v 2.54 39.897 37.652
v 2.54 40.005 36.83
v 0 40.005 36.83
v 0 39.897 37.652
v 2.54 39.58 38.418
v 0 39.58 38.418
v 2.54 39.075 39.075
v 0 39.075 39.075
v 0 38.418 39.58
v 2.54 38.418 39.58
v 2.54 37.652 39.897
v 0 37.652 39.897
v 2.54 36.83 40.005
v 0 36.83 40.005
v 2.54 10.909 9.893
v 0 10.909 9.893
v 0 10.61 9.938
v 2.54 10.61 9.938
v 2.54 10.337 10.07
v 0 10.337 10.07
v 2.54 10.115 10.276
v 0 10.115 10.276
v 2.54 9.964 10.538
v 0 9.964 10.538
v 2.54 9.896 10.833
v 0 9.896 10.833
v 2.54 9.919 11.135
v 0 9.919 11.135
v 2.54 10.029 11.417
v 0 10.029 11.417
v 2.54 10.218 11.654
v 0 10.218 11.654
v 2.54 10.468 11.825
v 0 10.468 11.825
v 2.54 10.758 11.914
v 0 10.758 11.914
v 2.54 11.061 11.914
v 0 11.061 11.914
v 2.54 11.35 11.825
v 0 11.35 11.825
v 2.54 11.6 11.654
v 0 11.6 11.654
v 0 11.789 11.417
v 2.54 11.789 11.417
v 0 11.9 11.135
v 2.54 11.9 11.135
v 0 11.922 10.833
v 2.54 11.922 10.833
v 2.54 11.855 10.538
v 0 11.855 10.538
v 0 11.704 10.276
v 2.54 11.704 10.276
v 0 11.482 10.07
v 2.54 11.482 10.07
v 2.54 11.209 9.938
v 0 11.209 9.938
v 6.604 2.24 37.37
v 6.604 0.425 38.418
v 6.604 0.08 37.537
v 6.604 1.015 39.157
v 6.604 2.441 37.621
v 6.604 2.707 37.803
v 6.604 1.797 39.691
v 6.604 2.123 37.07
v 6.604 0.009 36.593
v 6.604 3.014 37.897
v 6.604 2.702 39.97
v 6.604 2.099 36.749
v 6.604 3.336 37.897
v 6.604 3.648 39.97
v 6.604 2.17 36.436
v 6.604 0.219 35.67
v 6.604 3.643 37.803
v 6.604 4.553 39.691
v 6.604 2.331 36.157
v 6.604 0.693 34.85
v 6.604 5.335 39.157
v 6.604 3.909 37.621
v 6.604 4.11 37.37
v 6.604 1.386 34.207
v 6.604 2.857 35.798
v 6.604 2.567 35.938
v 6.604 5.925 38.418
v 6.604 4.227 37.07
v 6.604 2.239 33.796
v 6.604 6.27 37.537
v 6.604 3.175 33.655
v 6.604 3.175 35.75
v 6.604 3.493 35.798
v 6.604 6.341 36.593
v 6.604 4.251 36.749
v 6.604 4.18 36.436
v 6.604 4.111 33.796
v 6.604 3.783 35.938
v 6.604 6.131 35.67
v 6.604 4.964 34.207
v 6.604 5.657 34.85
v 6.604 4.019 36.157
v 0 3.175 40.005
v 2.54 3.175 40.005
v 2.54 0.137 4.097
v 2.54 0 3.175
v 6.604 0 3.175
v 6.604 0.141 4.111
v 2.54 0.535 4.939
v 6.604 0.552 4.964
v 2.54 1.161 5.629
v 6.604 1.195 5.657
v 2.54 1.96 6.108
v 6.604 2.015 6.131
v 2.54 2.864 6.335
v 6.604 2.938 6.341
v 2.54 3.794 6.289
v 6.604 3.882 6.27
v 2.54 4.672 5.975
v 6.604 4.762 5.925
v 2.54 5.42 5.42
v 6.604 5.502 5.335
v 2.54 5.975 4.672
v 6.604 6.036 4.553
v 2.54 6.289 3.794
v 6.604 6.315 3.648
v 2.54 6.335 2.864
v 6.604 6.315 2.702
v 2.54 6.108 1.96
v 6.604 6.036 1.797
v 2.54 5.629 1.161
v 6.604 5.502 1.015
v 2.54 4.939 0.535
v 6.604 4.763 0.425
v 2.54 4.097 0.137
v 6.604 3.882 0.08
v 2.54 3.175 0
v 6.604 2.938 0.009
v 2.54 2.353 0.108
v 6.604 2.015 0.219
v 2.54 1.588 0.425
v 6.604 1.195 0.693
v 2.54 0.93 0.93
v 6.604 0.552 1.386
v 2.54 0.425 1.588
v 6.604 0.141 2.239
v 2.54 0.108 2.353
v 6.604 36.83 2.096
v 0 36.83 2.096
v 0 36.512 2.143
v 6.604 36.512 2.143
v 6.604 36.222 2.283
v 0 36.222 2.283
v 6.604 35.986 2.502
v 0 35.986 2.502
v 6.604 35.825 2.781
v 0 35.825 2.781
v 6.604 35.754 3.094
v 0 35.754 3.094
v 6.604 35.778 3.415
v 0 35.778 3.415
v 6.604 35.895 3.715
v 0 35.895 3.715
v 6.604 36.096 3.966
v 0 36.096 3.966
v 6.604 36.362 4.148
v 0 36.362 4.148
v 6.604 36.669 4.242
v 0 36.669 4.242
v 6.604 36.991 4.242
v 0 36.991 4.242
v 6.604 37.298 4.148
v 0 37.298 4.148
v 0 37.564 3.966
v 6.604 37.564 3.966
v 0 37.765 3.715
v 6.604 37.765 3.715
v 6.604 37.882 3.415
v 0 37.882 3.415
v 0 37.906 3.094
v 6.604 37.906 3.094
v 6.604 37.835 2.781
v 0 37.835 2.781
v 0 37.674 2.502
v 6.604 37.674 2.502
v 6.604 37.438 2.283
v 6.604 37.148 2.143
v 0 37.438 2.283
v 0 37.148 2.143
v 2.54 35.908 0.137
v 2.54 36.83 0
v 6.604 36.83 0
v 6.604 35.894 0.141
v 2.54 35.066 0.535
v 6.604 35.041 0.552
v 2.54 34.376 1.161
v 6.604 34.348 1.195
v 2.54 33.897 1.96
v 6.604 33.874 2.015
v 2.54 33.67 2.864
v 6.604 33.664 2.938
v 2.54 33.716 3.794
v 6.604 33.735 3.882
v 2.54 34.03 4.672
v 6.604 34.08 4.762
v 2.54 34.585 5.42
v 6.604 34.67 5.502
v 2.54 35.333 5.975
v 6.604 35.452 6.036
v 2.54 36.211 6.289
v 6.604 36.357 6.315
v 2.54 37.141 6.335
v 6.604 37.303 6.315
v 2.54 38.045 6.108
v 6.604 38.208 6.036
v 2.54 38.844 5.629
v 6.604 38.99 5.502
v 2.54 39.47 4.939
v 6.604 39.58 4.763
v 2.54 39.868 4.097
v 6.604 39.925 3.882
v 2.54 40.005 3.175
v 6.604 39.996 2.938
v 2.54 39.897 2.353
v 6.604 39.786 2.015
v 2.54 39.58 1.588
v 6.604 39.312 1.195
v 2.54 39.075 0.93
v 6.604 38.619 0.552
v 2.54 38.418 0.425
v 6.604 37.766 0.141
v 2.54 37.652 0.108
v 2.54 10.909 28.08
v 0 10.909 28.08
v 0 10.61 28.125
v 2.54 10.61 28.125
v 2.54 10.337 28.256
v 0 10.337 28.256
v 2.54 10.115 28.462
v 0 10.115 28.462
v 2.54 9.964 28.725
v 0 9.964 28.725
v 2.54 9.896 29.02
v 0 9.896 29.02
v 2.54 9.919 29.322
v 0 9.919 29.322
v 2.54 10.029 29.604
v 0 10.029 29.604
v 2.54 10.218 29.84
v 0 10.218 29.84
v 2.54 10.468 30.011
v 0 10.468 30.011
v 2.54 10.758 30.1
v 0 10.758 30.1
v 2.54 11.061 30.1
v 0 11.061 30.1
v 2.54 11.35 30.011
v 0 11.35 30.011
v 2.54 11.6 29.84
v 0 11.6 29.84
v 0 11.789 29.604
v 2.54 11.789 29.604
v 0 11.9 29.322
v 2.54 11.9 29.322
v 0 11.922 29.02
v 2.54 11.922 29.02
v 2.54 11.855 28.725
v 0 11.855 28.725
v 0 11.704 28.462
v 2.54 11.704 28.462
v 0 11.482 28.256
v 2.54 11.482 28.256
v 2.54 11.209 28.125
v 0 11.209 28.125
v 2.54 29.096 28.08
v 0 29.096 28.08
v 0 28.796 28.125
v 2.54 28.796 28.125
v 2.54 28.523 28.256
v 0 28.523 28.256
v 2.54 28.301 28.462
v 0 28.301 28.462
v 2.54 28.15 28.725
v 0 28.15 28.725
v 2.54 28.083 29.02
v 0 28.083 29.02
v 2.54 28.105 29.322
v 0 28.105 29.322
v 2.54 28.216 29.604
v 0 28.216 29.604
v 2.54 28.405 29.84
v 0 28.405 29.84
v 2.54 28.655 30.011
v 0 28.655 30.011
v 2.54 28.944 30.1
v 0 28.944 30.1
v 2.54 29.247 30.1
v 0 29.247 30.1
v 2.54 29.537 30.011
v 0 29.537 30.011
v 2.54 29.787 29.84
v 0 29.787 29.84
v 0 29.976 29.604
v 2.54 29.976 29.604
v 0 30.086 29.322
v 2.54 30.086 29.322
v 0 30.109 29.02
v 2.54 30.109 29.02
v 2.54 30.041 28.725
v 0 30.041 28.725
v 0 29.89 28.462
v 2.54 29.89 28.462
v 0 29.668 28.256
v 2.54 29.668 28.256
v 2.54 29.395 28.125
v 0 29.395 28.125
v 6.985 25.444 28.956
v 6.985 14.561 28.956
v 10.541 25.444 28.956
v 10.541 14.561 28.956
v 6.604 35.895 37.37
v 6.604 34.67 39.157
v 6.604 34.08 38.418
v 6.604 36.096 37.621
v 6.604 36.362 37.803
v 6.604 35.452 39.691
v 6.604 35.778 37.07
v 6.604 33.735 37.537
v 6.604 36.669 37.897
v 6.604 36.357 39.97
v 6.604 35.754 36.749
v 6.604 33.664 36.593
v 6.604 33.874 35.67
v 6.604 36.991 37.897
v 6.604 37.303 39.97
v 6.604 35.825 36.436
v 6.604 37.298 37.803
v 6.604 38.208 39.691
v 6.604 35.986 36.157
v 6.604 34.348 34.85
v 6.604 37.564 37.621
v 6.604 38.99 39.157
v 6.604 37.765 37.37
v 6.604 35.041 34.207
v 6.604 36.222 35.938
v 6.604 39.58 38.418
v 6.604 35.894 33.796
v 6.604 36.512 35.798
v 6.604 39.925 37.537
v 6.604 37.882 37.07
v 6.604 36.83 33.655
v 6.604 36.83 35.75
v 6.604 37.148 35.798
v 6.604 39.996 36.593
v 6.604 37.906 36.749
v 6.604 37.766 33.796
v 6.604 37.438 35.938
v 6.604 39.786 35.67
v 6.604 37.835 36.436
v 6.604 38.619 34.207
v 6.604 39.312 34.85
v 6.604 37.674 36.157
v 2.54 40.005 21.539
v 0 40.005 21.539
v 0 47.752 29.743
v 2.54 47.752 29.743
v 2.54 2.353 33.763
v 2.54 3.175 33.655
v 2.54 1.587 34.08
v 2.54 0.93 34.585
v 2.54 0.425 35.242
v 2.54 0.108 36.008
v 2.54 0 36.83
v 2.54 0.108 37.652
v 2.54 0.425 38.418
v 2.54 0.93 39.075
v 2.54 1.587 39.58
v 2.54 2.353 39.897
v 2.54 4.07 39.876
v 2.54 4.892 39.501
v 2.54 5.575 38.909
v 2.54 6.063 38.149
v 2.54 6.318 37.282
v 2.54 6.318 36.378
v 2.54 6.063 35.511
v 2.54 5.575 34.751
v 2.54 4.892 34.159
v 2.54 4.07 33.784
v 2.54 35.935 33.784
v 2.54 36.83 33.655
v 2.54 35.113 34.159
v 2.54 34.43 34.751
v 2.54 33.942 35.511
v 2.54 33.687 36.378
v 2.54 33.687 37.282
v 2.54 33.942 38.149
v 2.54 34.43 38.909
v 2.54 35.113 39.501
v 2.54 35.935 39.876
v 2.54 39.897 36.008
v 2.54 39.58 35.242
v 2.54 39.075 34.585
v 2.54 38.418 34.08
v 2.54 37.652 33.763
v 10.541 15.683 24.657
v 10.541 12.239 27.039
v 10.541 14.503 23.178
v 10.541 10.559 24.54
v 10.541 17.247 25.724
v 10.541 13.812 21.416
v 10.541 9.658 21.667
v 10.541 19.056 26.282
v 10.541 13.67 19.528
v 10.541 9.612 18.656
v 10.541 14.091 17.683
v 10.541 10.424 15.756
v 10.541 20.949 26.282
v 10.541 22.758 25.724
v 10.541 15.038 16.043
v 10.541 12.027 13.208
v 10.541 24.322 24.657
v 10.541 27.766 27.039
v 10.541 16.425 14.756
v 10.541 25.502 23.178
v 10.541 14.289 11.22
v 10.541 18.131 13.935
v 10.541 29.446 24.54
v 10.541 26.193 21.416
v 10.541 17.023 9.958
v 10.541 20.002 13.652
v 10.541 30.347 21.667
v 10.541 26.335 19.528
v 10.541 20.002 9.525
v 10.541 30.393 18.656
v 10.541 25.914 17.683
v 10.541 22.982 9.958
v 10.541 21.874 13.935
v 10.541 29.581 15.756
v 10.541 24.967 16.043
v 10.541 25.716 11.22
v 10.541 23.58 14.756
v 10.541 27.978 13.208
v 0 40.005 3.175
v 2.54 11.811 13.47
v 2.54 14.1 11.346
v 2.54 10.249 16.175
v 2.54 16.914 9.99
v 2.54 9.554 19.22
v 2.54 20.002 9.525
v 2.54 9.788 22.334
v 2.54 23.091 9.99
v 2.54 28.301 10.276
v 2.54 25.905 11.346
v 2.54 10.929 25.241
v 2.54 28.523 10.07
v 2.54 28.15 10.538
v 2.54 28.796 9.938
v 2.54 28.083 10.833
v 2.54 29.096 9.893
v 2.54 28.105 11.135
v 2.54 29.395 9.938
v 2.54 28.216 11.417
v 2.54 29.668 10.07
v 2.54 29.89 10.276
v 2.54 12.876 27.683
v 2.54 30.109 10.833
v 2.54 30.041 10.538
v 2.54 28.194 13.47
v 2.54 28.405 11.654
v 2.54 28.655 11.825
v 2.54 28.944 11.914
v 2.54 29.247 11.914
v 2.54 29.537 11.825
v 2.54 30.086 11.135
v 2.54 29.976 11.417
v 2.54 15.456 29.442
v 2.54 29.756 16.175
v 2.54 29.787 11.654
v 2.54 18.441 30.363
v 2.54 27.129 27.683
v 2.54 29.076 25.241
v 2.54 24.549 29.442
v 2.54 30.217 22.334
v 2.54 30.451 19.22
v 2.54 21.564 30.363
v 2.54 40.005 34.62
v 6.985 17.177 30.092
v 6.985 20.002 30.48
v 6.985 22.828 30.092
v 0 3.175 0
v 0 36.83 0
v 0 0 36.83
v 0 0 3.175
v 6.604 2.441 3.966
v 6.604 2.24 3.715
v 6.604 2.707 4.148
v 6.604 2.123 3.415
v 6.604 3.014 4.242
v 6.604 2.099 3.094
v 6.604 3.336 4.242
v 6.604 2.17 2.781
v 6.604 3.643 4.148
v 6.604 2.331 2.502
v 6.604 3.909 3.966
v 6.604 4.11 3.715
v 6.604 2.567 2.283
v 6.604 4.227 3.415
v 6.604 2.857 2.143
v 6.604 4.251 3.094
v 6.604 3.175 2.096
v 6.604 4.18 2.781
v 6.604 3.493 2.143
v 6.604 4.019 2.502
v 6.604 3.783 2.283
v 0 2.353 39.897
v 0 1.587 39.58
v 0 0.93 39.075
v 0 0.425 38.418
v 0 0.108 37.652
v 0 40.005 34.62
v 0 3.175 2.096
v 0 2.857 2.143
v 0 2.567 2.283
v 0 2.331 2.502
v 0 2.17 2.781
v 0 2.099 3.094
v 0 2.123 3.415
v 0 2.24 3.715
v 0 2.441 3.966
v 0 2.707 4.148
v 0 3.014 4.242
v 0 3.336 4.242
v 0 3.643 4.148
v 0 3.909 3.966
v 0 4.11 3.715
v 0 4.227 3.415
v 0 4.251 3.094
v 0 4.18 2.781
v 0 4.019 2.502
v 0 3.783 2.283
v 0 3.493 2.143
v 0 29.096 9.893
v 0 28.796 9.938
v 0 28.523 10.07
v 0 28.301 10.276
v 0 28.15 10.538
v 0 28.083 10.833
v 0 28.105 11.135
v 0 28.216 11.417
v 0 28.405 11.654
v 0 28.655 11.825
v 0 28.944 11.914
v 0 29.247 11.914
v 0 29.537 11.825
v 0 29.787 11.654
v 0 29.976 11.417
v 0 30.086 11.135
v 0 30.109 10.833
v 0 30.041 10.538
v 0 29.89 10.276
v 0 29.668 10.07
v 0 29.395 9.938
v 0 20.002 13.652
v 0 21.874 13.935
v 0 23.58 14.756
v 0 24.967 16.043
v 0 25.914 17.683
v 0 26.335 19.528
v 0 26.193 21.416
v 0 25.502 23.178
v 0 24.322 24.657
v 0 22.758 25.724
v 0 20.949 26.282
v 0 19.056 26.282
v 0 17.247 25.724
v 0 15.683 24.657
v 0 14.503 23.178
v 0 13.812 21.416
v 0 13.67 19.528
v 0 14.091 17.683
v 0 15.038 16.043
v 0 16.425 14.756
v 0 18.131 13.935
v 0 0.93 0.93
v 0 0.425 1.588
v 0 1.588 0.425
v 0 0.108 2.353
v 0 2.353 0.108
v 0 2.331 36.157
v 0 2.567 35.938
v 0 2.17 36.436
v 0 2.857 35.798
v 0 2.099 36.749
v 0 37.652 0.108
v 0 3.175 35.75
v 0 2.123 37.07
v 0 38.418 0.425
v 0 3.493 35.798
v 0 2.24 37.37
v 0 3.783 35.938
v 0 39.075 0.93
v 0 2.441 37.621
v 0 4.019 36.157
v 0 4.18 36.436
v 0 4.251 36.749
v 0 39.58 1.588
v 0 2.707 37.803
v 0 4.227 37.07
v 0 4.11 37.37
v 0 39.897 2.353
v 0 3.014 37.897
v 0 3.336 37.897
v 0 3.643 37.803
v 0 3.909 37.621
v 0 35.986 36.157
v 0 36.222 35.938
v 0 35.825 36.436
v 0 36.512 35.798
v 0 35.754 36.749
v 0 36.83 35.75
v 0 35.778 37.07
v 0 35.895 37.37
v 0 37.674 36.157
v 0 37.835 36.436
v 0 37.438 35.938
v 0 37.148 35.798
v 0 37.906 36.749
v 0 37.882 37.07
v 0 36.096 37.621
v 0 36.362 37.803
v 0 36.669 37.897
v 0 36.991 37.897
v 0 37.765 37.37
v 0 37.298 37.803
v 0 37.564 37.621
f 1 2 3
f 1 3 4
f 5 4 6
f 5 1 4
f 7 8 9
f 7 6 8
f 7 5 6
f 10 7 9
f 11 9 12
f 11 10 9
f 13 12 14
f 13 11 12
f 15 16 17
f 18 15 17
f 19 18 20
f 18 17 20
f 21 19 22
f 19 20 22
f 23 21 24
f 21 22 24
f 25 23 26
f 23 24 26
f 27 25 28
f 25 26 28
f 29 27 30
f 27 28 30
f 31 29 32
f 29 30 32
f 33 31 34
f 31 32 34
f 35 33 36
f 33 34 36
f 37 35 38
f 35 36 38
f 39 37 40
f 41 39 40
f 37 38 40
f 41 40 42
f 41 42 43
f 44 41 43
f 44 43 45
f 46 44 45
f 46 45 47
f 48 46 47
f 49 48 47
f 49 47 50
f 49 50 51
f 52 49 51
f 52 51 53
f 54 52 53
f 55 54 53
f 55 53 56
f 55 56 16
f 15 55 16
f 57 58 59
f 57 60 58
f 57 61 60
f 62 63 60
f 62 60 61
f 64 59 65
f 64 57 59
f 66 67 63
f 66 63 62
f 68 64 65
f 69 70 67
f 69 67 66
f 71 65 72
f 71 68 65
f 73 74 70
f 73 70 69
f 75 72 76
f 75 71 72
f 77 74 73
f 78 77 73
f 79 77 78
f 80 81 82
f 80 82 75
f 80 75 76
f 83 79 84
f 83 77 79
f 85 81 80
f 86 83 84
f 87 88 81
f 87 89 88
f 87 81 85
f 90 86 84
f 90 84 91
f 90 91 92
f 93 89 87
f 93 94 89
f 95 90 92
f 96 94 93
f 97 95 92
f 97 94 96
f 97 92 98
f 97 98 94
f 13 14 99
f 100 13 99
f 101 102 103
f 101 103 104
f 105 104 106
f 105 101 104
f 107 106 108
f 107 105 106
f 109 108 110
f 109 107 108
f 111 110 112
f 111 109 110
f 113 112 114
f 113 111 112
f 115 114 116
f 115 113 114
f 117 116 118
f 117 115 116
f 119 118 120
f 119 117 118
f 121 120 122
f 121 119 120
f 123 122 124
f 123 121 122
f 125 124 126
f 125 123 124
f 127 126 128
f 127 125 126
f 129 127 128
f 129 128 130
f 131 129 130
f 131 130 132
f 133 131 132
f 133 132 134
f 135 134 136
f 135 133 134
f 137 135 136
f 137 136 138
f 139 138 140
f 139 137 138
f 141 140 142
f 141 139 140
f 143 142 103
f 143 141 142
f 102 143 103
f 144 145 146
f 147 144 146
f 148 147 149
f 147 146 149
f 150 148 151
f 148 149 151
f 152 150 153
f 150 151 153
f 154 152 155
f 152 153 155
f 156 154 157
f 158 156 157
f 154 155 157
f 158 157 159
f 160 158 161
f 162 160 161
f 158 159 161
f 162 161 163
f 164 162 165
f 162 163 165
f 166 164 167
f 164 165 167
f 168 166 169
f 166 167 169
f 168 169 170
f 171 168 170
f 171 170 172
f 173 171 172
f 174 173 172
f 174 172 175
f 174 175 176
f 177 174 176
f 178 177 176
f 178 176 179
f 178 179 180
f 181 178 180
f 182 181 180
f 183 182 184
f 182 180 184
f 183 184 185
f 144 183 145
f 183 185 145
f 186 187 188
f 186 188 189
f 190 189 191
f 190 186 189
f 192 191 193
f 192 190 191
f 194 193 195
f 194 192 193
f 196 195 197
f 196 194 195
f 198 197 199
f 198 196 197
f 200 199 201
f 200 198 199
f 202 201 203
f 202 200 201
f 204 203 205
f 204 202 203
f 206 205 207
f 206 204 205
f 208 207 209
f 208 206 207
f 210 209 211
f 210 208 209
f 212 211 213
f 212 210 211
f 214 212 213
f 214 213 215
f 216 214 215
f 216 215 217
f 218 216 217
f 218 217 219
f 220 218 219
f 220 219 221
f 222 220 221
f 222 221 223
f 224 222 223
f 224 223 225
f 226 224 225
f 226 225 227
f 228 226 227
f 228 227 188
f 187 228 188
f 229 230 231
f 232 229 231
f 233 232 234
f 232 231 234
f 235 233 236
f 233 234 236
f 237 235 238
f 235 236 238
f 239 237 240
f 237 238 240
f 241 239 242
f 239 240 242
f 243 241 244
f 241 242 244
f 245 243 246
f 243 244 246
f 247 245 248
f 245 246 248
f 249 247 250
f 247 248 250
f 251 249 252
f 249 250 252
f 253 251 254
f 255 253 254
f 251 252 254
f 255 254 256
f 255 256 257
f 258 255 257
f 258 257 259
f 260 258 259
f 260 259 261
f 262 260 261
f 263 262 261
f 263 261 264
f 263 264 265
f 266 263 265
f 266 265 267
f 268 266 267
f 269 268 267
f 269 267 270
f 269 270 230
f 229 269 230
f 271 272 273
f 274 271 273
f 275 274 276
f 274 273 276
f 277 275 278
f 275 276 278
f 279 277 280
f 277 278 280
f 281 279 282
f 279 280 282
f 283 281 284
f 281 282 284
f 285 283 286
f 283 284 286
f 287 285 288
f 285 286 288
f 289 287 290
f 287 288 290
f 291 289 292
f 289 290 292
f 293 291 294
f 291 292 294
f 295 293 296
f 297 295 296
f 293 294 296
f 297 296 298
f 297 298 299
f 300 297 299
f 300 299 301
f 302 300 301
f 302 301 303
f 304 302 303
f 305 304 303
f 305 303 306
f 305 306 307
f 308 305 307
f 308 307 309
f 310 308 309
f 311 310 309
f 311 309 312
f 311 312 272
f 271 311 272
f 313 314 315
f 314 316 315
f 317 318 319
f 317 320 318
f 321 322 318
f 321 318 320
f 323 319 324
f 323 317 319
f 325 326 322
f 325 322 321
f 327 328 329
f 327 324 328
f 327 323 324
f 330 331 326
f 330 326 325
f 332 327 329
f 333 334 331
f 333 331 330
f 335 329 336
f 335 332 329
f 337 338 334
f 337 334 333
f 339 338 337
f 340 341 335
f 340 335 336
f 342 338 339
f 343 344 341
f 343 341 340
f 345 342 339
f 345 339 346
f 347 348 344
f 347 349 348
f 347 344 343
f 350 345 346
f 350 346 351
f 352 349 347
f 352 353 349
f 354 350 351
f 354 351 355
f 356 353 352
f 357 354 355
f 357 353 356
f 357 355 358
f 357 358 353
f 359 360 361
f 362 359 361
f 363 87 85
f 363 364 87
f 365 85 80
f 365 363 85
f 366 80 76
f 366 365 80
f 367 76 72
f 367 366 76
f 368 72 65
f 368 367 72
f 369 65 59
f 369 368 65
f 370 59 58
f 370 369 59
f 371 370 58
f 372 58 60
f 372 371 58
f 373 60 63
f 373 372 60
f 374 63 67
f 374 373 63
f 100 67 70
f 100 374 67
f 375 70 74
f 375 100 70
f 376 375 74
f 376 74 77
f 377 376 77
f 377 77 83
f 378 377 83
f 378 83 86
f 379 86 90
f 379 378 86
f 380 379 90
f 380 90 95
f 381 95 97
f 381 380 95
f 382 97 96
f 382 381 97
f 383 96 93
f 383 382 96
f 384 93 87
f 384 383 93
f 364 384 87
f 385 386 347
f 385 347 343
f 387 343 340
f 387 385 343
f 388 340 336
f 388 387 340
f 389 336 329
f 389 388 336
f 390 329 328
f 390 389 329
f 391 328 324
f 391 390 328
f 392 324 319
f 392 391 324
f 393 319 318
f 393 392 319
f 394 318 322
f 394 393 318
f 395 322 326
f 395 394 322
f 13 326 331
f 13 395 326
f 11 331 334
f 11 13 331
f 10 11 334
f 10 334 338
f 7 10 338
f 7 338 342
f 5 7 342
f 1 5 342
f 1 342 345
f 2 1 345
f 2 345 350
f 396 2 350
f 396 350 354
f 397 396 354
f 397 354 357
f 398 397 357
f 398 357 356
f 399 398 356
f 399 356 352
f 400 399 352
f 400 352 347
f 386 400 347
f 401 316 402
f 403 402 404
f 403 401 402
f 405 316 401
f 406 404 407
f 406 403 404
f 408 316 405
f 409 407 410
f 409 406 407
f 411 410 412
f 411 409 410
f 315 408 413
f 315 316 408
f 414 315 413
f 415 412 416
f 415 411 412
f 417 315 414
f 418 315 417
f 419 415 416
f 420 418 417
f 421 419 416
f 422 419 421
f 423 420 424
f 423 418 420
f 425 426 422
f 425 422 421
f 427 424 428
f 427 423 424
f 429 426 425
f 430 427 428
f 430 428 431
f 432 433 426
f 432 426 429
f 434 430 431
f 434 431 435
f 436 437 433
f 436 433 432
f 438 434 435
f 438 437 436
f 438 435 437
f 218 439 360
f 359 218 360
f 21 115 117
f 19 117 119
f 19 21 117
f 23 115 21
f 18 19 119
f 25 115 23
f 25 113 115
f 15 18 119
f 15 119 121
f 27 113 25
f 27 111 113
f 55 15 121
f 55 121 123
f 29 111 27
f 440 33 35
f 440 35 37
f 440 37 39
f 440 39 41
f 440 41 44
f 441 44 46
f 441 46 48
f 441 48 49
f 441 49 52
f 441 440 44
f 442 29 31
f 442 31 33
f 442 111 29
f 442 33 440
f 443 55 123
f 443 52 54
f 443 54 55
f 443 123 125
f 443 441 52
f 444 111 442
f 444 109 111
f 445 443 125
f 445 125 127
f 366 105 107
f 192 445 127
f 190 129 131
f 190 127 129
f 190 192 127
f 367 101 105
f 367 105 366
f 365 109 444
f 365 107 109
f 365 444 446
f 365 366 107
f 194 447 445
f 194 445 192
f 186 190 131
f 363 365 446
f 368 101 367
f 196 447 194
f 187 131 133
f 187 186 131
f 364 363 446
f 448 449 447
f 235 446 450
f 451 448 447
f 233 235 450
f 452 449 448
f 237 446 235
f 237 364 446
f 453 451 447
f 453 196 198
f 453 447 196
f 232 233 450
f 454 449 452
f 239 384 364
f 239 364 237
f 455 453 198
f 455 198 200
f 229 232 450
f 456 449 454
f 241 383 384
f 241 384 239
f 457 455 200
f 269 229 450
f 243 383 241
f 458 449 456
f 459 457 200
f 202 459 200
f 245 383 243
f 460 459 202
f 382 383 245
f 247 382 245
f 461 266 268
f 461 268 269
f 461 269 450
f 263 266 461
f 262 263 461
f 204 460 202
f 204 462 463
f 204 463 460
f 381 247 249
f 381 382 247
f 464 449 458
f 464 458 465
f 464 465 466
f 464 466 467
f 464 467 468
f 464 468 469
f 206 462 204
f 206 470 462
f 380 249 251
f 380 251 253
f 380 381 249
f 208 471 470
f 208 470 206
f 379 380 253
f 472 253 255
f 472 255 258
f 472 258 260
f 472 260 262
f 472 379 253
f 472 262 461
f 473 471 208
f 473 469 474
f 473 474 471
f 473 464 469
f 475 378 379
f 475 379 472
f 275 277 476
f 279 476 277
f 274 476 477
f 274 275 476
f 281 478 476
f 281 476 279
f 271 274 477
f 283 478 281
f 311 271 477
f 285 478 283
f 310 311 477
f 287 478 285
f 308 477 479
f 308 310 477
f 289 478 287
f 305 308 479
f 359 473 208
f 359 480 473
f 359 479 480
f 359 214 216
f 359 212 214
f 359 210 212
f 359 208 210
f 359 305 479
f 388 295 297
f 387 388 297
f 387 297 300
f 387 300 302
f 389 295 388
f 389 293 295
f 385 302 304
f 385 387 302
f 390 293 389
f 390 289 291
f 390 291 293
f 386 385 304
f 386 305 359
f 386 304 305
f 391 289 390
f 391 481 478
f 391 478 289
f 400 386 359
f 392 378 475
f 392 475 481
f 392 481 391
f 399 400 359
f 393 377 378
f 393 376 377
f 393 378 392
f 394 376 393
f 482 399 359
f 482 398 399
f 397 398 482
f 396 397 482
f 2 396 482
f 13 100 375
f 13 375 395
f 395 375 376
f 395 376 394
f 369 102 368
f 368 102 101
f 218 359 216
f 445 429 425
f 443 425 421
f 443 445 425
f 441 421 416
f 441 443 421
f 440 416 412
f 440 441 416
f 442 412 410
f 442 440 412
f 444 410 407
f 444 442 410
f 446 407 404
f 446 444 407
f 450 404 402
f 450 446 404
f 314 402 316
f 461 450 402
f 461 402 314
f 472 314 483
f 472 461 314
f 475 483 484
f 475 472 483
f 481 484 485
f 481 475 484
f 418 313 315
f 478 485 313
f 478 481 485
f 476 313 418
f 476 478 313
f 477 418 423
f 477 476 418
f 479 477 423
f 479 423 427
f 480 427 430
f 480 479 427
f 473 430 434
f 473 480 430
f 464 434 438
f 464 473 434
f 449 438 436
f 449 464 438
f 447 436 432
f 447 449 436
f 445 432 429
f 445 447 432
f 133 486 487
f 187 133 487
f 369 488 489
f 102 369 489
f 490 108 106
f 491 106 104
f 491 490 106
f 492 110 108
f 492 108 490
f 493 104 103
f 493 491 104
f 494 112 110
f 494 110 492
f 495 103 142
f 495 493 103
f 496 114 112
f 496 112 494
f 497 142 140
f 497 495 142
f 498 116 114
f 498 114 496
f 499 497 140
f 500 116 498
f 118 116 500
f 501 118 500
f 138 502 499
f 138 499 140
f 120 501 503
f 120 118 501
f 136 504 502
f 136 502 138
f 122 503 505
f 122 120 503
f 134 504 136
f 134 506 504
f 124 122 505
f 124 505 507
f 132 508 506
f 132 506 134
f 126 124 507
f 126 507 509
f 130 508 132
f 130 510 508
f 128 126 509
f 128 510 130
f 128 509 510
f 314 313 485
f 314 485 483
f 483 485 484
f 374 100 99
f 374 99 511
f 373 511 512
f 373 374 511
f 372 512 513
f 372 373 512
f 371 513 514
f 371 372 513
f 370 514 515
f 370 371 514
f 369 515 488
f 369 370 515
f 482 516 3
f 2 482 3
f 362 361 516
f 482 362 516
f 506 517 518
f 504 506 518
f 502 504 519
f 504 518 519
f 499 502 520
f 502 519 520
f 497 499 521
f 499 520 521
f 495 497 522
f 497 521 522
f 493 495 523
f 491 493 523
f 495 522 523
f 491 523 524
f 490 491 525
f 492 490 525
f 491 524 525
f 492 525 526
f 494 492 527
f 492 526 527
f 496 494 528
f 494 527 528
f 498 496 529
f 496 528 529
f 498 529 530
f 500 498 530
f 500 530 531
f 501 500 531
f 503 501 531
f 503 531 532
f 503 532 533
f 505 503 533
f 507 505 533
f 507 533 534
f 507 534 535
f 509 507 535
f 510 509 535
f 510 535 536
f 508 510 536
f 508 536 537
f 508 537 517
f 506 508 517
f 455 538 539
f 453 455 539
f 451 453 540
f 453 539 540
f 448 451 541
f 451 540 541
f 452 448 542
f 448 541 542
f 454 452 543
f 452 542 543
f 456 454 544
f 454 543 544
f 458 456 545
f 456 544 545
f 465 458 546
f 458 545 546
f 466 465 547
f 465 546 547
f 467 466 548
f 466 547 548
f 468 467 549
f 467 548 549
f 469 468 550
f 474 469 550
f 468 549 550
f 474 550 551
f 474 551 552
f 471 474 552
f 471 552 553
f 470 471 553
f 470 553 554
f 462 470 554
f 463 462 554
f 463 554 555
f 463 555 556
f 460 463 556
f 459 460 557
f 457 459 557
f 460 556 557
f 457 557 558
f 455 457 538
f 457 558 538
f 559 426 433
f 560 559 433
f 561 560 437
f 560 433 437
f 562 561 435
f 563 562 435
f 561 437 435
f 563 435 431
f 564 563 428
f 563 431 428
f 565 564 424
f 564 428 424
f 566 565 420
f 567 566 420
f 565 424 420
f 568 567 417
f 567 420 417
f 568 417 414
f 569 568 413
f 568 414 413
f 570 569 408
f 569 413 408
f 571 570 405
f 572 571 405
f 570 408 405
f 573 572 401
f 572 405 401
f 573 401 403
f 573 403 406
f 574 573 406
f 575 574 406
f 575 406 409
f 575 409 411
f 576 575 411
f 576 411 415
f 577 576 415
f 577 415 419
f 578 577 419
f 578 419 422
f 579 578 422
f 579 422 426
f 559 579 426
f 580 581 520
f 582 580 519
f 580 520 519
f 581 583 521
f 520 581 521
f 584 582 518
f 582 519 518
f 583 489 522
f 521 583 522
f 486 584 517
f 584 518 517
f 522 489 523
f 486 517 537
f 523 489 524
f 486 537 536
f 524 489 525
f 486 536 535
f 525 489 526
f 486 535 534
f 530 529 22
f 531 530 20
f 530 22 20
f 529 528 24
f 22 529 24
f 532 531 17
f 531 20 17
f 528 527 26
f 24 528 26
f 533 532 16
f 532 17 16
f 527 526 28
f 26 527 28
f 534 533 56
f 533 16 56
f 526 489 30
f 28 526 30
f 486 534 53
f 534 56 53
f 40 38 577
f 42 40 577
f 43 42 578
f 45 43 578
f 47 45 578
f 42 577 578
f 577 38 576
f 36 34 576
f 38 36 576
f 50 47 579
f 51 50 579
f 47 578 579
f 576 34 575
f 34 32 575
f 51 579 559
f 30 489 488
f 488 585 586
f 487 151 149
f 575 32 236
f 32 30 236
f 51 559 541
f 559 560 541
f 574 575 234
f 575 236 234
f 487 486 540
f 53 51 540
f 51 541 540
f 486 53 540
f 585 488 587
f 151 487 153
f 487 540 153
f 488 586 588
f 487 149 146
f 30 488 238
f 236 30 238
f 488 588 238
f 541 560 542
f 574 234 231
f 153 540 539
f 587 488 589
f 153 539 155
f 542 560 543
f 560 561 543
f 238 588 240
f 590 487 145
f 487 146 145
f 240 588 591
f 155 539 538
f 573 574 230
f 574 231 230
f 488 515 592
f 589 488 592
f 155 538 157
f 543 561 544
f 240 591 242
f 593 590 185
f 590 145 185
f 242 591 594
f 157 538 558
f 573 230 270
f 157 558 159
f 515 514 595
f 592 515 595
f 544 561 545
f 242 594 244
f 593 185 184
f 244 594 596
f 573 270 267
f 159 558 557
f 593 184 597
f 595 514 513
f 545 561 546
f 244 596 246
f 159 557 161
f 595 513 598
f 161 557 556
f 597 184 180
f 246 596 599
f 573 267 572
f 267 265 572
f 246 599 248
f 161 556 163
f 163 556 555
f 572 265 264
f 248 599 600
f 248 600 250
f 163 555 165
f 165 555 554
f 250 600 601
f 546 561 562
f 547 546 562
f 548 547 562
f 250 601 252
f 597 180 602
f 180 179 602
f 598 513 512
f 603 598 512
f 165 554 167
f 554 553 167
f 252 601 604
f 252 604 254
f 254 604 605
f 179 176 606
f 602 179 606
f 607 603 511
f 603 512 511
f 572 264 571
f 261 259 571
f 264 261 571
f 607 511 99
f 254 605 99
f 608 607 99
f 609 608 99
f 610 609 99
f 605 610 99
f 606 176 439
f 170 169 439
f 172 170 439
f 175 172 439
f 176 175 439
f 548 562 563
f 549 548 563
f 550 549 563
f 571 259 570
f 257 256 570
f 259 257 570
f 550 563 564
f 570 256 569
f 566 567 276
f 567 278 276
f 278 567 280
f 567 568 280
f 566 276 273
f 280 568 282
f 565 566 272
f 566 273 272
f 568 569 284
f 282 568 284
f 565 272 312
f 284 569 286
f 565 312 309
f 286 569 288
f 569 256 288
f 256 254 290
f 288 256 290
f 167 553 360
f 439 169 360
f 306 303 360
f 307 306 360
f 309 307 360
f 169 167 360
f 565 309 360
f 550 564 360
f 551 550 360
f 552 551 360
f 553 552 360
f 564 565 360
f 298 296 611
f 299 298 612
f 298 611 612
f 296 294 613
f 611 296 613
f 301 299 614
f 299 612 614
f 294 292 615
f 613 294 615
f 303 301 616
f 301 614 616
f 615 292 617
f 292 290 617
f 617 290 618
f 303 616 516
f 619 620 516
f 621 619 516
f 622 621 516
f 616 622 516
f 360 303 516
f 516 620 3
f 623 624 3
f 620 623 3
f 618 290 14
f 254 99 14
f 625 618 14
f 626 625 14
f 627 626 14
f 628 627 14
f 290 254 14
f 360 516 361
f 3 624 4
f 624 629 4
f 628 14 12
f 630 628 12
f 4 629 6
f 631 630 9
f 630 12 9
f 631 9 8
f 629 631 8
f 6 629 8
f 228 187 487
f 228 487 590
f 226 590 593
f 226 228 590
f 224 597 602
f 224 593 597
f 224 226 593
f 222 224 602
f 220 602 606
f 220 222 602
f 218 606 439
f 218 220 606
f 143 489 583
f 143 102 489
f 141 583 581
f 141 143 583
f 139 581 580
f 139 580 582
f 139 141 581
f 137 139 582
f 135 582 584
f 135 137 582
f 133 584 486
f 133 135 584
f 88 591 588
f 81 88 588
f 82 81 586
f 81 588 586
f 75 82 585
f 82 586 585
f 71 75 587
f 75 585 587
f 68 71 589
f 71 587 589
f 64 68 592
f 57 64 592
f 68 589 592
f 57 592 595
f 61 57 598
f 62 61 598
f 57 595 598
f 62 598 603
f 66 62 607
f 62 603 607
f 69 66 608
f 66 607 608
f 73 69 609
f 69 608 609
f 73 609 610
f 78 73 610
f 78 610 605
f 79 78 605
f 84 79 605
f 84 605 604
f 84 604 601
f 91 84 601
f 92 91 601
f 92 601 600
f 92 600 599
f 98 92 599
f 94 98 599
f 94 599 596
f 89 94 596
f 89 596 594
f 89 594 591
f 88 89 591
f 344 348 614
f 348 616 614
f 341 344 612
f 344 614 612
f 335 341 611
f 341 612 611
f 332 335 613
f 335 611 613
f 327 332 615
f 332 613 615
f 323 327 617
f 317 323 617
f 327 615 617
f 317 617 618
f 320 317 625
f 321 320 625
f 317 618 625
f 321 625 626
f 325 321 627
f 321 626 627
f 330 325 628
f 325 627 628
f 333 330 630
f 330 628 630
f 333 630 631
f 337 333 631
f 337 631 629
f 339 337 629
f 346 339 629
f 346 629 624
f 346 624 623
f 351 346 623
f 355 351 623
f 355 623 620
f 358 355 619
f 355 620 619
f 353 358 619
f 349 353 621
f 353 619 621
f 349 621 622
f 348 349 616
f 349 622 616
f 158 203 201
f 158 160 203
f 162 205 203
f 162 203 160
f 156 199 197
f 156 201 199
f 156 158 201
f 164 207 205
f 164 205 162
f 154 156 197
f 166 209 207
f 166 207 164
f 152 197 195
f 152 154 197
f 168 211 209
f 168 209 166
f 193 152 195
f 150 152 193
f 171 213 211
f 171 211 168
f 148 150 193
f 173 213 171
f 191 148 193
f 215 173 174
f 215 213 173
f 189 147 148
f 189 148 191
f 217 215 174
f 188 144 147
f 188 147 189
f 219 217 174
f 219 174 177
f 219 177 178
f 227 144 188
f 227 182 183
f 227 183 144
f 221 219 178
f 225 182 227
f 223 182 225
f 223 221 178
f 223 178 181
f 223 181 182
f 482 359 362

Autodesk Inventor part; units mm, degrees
ref_plane "YZ Plane" through (0, 0, 0) normal (1, 0, 0) x (0, 1, 0)
ref_plane "XZ Plane" through (0, 0, 0) normal (0, 1, 0) x (-1, 0, 0)
ref_plane "XY Plane" through (0, 0, 0) normal (0, 0, 1) x (1, 0, 0)
sketch "Sketch1" plane through (0, 0, 0) normal (1, 0, 0) x (0, 1, 0)
  line L0 (0, 0) -> (40.005, 0)
  line L1 (40.005, 0) -> (40.005, 40.005)
  line L2 (40.005, 40.005) -> (0, 40.005)
  line L3 (0, 40.005) -> (0, 0)
  dimension "d0" = 40.005
  dimension "d1" = 40.005
extrude "Extrusion1" add sketch "Sketch1" along normal blind 2.54
fillet "Fillet1" radius 3.175 4 edges at (1.27, 40.005, 40.005) (1.27, 0, 40.005) (1.27, 0, 0) (1.27, 40.005, 0)
sketch "Sketch2" plane through (2.54, 0, 0) normal (1, 0, 0) x (0, 0, -1)
  arc A0 (0, 36.83) -> (-3.175, 40.005) centre (-3.175, 36.83) ccw projected
  arc A1 (-36.83, 40.005) -> (-40.005, 36.83) centre (-36.83, 36.83) ccw projected
  arc A2 (-40.005, 3.175) -> (-36.83, 0) centre (-36.83, 3.175) ccw projected
  arc A3 (-3.175, 0) -> (0, 3.175) centre (-3.175, 3.175) ccw projected
  circle A4 centre (-36.83, 3.175) radius 3.175
  circle A5 centre (-36.83, 36.83) radius 3.175
  circle A6 centre (-3.175, 36.83) radius 3.175
  circle A7 centre (-3.175, 3.175) radius 3.175
  point P0 (0, 0)
extrude "Extrusion2" add sketch "Sketch2" along normal blind 4.064
sketch "Sketch3" plane through (6.604, 3.175, 36.83) normal (1, 0, 0) x (0, 0, -1)
  circle A0 centre (0, 0) radius 3.175 projected
  circle A1 centre (0, 33.655) radius 3.175 projected
  circle A2 centre (33.655, 33.655) radius 3.175 projected
  circle A3 centre (33.655, 0) radius 3.175 projected
  point P0 (36.83, -3.175)
hole "Hole1" at (6.604, 36.83, 36.83) at (6.604, 36.83, 3.175) at (6.604, 3.175, 3.175) at (6.604, 3.175, 36.83) direction (-1, 0, 0) diameter 2.159 end through all
sketch "Sketch4" plane through (2.54, 0, 0) normal (1, 0, 0) x (0, 0, -1)
  arc A0 (-3.175, 40.005) -> (0, 36.83) centre (-3.175, 36.83) ccw projected
  arc A1 (-36.83, 0) -> (-40.005, 3.175) centre (-36.83, 3.175) ccw projected
  line L0 (-10.9093, 10.9093) -> (-29.0957, 10.9093)
  line L1 (-29.0957, 10.9093) -> (-29.0957, 29.0957)
  line L2 (-29.0957, 29.0957) -> (-10.9093, 29.0957)
  line L3 (-10.9093, 29.0957) -> (-10.9093, 10.9093)
  line L4 (-36.83, 3.175) -> (-3.175, 36.83) construction
  line L5 (-10.9093, 10.9093) -> (-29.0957, 29.0957) construction
  point P0 (0, 0)
  point P1 (-20.0025, 20.0025)
  dimension "d14" = 18.1864
hole "Hole2" at (2.54, 10.9093, 29.0957) at (2.54, 29.0957, 29.0957) at (2.54, 10.9093, 10.9093) at (2.54, 29.0957, 10.9093) direction (-1, 0, 0) diameter 2.032 end through all
sketch "Sketch5" plane through (2.54, 0, 0) normal (1, 0, 0) x (0, 0, -1)
  circle A0 centre (-10.9093, 10.9093) radius 1.016 projected
  circle A1 centre (-29.0957, 29.0957) radius 1.016 projected
  line L0 (-29.0957, 29.0957) -> (-10.9093, 10.9093) construction
  circle A2 centre (-20.0025, 20.0025) radius 10.4775
  point P0 (0, 0)
  dimension "d23" = 20.955
extrude "Extrusion3" add sketch "Sketch5" along normal blind 8.001 contours A2
sketch "Sketch6" plane through (10.541, 20.0025, 20.0025) normal (1, 0, 0) x (0, 0, -1)
  circle A0 centre (0, 0) radius 10.4775 projected
  circle A1 centre (0, 0) radius 6.35
  point P0 (20.0025, -20.0025)
  dimension "d27" = 6.35
extrude "Extrusion4" cut sketch "Sketch6" against normal through all contours A1
sketch "Sketch7" plane through (10.541, 20.0025, 20.0025) normal (1, 0, 0) x (0, 0, -1)
  circle A0 centre (0, 0) radius 10.4775 projected
  line L0 (-10.4775, -5.4418) -> (-8.9535, -5.4418)
  line L1 (-8.9535, -5.4418) -> (-8.9535, 5.4418)
  line L2 (-8.9535, 5.4418) -> (-10.4775, 5.4418)
  line L3 (-10.4775, 5.4418) -> (-10.4775, -5.4418)
  point P0 (20.0025, -20.0025)
  dimension "d30" = 19.431
extrude "Extrusion5" cut sketch "Sketch7" against normal blind 3.556 contours L1 A0 | A0 L3 L2 | L0 L3 A0 picked at (-9.2326, 1.2437)
sketch "Sketch10" plane through (0, 0, 0) normal (-1, 0, 0) x (0, 0, 1)
  line L0 (3.175, 40.005) -> (36.83, 40.005) projected
  line L1 (21.5392, 40.005) -> (29.7434, 47.752)
  line L2 (29.7434, 47.752) -> (34.6202, 40.005)
  line L3 (36.83, 0) -> (3.175, 0) projected
  line L4 (40.005, 36.83) -> (40.005, 3.175) projected
  point P0 (0, 0)
  dimension "d43" = 5.3848
  dimension "d44" = 10.2616
  dimension "d45" = 18.4658
  dimension "d46" = 47.752
extrude "Extrusion8" add sketch "Sketch10" against normal up to surface (2.54 mm away)
equation "\"d1\" = d0"
properties part number "Face Plate" material "PC/ABS Plastic"
